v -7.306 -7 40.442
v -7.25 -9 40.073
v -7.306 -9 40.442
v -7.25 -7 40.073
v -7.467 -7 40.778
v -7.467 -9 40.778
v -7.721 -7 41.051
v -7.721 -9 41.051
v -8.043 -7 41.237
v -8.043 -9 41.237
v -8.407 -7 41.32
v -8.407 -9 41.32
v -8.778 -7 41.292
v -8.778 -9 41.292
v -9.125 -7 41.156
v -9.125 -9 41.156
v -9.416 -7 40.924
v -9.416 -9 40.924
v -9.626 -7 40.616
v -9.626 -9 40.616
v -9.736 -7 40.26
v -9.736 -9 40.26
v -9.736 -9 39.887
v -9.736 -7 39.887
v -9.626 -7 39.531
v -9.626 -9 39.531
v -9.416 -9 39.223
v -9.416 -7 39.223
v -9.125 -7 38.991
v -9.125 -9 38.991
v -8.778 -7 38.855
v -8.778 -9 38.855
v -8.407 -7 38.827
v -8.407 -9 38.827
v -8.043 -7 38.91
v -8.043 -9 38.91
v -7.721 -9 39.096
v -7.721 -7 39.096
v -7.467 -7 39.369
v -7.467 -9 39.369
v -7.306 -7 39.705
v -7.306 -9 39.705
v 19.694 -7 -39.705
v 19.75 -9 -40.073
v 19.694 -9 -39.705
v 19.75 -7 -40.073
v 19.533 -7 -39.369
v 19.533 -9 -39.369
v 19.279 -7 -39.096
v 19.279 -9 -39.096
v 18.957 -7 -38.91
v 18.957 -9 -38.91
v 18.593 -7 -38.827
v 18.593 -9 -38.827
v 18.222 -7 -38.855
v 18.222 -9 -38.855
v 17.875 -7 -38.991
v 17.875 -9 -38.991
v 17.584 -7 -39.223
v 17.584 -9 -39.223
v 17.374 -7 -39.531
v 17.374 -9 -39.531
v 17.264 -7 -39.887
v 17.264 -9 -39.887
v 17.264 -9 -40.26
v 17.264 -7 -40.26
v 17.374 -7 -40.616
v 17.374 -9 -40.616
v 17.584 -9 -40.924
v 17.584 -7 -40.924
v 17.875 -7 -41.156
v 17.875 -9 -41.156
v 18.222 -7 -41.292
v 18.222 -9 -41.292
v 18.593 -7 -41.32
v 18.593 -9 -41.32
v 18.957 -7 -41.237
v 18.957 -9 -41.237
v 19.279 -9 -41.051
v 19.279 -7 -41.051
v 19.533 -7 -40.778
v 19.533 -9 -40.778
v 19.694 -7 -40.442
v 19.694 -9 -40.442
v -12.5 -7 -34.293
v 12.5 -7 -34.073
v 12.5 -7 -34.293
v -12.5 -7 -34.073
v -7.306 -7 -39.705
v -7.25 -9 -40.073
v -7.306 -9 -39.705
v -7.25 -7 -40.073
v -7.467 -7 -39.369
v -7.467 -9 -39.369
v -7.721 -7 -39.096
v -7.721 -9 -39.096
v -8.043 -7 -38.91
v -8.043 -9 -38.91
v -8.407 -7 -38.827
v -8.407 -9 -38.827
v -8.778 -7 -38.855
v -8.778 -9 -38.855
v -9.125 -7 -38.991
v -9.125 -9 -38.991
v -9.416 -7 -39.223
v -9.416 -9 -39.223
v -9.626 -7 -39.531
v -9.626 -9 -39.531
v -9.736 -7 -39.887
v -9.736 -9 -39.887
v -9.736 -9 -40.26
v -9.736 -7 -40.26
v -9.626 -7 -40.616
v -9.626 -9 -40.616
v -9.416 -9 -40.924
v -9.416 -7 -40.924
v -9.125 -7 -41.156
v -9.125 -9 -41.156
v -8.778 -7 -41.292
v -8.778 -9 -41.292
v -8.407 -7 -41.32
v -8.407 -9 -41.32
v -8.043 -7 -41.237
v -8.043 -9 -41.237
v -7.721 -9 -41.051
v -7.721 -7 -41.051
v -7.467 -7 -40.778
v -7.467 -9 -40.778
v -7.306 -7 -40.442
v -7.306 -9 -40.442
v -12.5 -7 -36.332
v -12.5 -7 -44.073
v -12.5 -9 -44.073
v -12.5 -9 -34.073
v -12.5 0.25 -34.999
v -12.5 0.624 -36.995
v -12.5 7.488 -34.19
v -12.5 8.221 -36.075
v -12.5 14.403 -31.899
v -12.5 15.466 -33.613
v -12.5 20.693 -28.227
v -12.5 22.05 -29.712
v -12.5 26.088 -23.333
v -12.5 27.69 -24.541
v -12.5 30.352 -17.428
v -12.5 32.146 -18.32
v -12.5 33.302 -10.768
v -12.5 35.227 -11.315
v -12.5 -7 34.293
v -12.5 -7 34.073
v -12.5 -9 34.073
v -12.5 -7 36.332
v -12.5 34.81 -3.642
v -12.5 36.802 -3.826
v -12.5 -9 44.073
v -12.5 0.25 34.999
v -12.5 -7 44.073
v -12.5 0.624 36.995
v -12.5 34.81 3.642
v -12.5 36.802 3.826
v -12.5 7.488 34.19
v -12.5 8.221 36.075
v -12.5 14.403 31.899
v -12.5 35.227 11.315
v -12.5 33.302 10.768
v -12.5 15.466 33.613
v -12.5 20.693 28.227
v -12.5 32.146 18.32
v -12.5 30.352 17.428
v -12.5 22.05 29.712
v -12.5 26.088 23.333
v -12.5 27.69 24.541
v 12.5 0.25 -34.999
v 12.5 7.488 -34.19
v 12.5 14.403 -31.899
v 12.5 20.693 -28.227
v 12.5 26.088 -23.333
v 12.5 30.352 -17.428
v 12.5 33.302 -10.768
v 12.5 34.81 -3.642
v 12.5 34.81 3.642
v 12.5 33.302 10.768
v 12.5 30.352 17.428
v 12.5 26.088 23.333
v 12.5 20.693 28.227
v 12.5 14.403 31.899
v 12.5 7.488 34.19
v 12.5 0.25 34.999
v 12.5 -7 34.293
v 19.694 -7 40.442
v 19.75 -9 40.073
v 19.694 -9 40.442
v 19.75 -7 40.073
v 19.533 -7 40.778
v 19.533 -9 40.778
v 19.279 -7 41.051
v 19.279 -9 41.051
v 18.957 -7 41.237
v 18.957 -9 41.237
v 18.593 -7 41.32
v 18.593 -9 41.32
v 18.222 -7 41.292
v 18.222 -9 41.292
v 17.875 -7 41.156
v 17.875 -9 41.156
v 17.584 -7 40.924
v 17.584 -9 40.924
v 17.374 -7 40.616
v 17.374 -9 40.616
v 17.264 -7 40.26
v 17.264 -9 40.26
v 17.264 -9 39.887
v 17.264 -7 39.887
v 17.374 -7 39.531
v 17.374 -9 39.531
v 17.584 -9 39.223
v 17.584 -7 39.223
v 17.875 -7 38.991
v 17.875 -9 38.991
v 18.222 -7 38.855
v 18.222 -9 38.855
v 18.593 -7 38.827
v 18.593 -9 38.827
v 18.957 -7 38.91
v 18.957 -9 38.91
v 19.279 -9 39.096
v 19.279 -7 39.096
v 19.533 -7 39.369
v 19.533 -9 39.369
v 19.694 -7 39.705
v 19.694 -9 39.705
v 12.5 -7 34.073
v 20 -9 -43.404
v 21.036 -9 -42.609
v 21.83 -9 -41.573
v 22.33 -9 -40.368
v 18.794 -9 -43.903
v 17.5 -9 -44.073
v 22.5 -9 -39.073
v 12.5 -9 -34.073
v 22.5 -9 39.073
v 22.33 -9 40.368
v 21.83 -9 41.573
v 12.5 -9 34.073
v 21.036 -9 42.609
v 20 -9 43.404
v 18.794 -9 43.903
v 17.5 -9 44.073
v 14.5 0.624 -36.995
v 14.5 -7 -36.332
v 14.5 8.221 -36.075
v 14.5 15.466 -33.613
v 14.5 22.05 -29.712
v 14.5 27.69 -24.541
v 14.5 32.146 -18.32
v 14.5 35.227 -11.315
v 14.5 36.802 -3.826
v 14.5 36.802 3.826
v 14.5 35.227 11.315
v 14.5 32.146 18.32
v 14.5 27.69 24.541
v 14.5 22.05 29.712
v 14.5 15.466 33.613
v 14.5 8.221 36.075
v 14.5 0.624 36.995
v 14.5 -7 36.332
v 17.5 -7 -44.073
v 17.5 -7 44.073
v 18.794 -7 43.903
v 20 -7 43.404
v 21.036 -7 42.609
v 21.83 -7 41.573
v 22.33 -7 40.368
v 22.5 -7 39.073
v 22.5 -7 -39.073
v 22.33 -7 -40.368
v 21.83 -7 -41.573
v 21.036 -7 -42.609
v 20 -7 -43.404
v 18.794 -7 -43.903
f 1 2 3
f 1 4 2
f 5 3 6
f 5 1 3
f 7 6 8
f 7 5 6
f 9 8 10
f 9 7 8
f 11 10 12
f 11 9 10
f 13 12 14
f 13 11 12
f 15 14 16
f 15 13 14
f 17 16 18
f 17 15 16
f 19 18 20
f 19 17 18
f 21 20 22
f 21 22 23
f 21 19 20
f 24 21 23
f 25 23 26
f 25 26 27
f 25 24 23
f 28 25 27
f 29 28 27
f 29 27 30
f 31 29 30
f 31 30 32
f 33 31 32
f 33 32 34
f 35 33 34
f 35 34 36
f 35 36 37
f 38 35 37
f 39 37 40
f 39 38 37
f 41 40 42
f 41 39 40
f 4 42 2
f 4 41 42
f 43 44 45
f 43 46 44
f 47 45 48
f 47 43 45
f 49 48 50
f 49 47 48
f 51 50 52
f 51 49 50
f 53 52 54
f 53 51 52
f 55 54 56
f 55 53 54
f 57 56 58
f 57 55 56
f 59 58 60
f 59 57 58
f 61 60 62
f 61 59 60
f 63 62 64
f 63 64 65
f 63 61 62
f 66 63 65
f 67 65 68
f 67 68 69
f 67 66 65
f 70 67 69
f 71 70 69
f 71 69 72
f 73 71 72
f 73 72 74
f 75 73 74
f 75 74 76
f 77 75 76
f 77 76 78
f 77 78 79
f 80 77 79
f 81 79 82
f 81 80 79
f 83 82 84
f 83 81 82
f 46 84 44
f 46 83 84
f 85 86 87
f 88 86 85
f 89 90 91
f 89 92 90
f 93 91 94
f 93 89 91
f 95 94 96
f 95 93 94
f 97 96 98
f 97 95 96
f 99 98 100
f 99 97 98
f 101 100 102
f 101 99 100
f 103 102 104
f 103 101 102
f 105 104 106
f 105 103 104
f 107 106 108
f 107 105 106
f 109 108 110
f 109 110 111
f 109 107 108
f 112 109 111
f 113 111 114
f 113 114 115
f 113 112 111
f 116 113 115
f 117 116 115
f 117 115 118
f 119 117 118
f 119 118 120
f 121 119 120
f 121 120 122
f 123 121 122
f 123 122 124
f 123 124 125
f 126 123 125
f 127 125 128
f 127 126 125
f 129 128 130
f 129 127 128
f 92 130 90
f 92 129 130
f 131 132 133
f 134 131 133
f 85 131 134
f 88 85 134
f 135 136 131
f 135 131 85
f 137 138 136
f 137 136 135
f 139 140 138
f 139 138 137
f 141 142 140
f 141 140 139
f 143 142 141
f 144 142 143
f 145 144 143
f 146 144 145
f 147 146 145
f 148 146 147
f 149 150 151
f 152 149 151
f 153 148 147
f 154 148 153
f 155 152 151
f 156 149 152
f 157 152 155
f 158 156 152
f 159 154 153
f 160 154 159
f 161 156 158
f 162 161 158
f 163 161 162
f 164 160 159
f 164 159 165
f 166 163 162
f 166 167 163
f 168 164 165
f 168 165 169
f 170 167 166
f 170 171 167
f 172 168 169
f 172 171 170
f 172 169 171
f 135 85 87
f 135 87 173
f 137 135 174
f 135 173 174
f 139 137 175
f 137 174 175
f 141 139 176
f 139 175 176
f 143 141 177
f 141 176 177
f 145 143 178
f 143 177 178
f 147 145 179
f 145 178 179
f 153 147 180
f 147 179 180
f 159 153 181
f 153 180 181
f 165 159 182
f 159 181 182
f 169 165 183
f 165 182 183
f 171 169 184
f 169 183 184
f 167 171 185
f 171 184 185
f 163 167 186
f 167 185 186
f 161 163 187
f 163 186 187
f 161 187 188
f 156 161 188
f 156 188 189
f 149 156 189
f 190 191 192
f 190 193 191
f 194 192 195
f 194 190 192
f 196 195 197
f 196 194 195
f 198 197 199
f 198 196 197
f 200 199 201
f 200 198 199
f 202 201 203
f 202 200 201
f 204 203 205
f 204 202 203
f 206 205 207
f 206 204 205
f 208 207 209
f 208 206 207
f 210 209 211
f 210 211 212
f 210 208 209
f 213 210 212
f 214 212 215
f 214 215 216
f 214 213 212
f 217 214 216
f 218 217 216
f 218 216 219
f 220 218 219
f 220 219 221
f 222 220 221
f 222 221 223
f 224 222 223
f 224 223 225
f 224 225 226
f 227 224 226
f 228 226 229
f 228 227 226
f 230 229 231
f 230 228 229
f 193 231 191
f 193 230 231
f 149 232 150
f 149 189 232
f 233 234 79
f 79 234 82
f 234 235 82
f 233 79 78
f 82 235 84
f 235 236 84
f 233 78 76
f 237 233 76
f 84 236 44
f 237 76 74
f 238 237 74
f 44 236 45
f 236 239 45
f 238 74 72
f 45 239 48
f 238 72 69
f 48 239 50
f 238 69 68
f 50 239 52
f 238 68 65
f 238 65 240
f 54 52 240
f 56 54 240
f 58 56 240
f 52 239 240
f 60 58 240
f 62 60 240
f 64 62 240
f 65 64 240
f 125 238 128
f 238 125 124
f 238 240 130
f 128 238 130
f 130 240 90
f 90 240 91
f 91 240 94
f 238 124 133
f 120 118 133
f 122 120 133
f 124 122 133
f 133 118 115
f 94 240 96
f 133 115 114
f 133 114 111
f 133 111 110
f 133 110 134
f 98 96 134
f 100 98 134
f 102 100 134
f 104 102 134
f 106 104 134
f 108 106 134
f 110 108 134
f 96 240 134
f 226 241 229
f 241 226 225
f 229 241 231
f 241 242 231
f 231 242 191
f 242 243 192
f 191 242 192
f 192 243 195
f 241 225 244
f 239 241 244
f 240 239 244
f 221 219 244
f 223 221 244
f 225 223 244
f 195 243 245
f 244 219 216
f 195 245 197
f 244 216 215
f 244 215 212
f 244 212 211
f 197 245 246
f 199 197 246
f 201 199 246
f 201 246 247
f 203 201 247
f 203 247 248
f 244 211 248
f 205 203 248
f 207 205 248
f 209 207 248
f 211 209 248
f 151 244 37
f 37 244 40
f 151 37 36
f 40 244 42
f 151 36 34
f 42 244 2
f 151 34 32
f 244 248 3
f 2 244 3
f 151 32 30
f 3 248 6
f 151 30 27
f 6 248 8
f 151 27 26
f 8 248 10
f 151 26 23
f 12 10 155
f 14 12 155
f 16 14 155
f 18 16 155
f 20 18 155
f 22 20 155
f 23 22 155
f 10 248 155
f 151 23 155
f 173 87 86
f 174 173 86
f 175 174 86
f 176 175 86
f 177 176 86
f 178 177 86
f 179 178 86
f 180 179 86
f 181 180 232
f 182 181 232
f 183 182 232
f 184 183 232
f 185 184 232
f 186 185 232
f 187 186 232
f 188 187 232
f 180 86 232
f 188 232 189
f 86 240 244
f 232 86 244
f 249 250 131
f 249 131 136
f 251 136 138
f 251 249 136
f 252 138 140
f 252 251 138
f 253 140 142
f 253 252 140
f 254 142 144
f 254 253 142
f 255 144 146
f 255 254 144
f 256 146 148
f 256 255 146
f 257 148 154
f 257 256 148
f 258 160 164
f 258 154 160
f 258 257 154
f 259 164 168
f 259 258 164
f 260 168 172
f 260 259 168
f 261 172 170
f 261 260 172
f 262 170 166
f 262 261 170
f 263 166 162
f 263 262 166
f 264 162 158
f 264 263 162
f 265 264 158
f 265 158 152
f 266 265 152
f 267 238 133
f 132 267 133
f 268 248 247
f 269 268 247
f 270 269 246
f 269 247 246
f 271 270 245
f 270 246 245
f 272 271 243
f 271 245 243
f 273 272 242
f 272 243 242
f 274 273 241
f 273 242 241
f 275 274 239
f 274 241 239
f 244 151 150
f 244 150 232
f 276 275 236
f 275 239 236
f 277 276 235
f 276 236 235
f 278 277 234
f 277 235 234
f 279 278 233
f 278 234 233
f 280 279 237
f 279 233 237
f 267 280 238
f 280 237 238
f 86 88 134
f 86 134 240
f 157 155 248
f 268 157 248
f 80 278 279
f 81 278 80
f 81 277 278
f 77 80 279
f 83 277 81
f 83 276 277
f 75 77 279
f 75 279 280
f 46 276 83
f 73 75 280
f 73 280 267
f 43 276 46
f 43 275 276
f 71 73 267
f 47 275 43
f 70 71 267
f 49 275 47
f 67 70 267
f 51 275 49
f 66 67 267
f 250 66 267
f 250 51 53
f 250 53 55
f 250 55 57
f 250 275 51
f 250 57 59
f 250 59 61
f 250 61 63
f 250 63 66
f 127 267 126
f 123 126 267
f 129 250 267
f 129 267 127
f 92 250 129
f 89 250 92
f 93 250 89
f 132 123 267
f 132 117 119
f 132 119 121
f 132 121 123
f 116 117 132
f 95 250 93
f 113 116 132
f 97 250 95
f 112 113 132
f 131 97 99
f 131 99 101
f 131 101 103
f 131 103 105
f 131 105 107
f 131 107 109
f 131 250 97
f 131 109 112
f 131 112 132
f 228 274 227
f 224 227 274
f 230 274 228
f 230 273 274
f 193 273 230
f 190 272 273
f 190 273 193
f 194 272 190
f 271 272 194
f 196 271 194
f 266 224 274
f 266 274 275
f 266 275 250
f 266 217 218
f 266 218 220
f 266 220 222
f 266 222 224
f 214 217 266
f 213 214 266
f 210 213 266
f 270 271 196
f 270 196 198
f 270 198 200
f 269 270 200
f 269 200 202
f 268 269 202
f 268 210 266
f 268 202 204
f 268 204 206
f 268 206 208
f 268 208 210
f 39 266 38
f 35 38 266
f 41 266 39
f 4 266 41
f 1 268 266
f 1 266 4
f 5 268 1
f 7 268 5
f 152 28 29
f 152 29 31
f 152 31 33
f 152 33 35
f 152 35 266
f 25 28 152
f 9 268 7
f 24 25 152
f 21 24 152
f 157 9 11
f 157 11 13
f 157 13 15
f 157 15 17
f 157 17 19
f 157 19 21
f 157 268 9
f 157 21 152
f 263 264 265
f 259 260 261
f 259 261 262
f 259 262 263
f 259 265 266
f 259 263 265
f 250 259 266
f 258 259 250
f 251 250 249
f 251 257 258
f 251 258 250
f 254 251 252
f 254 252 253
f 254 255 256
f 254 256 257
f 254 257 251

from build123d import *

# Parameters (mm, degrees)
BOSS_EXTRUDE1_DEPTH = 14.5
SHELL1_T            = -2
SKETCH3_R           = 1.25
SKETCH3_W           = 25
SKETCH3_H           = 68.14690015
BOSS_EXTRUDE2_DEPTH = 1
CUT_EXTRUDE1_DEPTH  = 2


with BuildPart() as part:
    # Sketch1 → Boss-Extrude1 (new body, symmetric)
    with BuildSketch(Plane(origin=(0, 0, 0), x_dir=(0, 0, -1), z_dir=(1, 0, 0))):
        with BuildLine():
            Line((-36.124783736, -8), (36.124783736, -8))
            ThreePointArc((36.124783736, -8), (0, 37), (-36.124783736, -8))
        make_face()
    extrude(amount=BOSS_EXTRUDE1_DEPTH, both=True)

    # Shell1
    shell1_openings = [part.faces().sort_by_distance(p)[0] for p in [
        (0, -8, 0),
    ]]
    offset(amount=SHELL1_T, openings=shell1_openings)

    # Sketch3 → Boss-Extrude2 (add, symmetric)
    with BuildSketch(Plane.XZ.offset(8)):
        with BuildLine():
            Line((-9.5, 44.073450075), (17.5, 44.073450075))
            ThreePointArc((17.5, 44.073450075), (21.035533906, 42.608983981), (22.5, 39.073450075))
            Line((22.5, 39.073450075), (22.5, -39.073450075))
            ThreePointArc((22.5, -39.073450075), (21.035533906, -42.608983981), (17.5, -44.073450075))
            Line((17.5, -44.073450075), (-9.5, -44.073450075))
            Line((-9.5, -44.073450075), (-14.5, -44.073450075))
            Line((-14.5, -44.073450075), (-14.5, -39.073450075))
            Line((-14.5, -39.073450075), (-14.5, 39.073450075))
            Line((-14.5, 39.073450075), (-14.5, 44.073450075))
            Line((-14.5, 44.073450075), (-9.5, 44.073450075))
        make_face()
        with Locations((18.5, 40.073450075)):
            Circle(SKETCH3_R, mode=Mode.SUBTRACT)
        with Locations((-8.5, 40.073450075)):
            Circle(SKETCH3_R, mode=Mode.SUBTRACT)
        with Locations((18.5, -40.073450075)):
            Circle(SKETCH3_R, mode=Mode.SUBTRACT)
        with Locations((-8.5, -40.073450075)):
            Circle(SKETCH3_R, mode=Mode.SUBTRACT)
        Rectangle(SKETCH3_W, SKETCH3_H, mode=Mode.SUBTRACT)
    extrude(amount=BOSS_EXTRUDE2_DEPTH, both=True)

    # Sketch4 → Cut-Extrude1 (cut)
    with BuildSketch(Plane(origin=(-12.5, 0, 0), x_dir=(0, 0, -1), z_dir=(1, 0, 0))):
        with BuildLine():
            Line((-44.073450075, -7), (-36.331804249, -7))
            ThreePointArc((-36.331804249, -7), (0, 37), (36.331804249, -7))
            Line((36.331804249, -7), (44.073450075, -7))
            Line((44.073450075, -7), (44.073450075, -9))
            Line((44.073450075, -9), (-44.073450075, -9))
            Line((-44.073450075, -9), (-44.073450075, -7))
        make_face()
    extrude(amount=-CUT_EXTRUDE1_DEPTH, mode=Mode.SUBTRACT)


solid = part.part
